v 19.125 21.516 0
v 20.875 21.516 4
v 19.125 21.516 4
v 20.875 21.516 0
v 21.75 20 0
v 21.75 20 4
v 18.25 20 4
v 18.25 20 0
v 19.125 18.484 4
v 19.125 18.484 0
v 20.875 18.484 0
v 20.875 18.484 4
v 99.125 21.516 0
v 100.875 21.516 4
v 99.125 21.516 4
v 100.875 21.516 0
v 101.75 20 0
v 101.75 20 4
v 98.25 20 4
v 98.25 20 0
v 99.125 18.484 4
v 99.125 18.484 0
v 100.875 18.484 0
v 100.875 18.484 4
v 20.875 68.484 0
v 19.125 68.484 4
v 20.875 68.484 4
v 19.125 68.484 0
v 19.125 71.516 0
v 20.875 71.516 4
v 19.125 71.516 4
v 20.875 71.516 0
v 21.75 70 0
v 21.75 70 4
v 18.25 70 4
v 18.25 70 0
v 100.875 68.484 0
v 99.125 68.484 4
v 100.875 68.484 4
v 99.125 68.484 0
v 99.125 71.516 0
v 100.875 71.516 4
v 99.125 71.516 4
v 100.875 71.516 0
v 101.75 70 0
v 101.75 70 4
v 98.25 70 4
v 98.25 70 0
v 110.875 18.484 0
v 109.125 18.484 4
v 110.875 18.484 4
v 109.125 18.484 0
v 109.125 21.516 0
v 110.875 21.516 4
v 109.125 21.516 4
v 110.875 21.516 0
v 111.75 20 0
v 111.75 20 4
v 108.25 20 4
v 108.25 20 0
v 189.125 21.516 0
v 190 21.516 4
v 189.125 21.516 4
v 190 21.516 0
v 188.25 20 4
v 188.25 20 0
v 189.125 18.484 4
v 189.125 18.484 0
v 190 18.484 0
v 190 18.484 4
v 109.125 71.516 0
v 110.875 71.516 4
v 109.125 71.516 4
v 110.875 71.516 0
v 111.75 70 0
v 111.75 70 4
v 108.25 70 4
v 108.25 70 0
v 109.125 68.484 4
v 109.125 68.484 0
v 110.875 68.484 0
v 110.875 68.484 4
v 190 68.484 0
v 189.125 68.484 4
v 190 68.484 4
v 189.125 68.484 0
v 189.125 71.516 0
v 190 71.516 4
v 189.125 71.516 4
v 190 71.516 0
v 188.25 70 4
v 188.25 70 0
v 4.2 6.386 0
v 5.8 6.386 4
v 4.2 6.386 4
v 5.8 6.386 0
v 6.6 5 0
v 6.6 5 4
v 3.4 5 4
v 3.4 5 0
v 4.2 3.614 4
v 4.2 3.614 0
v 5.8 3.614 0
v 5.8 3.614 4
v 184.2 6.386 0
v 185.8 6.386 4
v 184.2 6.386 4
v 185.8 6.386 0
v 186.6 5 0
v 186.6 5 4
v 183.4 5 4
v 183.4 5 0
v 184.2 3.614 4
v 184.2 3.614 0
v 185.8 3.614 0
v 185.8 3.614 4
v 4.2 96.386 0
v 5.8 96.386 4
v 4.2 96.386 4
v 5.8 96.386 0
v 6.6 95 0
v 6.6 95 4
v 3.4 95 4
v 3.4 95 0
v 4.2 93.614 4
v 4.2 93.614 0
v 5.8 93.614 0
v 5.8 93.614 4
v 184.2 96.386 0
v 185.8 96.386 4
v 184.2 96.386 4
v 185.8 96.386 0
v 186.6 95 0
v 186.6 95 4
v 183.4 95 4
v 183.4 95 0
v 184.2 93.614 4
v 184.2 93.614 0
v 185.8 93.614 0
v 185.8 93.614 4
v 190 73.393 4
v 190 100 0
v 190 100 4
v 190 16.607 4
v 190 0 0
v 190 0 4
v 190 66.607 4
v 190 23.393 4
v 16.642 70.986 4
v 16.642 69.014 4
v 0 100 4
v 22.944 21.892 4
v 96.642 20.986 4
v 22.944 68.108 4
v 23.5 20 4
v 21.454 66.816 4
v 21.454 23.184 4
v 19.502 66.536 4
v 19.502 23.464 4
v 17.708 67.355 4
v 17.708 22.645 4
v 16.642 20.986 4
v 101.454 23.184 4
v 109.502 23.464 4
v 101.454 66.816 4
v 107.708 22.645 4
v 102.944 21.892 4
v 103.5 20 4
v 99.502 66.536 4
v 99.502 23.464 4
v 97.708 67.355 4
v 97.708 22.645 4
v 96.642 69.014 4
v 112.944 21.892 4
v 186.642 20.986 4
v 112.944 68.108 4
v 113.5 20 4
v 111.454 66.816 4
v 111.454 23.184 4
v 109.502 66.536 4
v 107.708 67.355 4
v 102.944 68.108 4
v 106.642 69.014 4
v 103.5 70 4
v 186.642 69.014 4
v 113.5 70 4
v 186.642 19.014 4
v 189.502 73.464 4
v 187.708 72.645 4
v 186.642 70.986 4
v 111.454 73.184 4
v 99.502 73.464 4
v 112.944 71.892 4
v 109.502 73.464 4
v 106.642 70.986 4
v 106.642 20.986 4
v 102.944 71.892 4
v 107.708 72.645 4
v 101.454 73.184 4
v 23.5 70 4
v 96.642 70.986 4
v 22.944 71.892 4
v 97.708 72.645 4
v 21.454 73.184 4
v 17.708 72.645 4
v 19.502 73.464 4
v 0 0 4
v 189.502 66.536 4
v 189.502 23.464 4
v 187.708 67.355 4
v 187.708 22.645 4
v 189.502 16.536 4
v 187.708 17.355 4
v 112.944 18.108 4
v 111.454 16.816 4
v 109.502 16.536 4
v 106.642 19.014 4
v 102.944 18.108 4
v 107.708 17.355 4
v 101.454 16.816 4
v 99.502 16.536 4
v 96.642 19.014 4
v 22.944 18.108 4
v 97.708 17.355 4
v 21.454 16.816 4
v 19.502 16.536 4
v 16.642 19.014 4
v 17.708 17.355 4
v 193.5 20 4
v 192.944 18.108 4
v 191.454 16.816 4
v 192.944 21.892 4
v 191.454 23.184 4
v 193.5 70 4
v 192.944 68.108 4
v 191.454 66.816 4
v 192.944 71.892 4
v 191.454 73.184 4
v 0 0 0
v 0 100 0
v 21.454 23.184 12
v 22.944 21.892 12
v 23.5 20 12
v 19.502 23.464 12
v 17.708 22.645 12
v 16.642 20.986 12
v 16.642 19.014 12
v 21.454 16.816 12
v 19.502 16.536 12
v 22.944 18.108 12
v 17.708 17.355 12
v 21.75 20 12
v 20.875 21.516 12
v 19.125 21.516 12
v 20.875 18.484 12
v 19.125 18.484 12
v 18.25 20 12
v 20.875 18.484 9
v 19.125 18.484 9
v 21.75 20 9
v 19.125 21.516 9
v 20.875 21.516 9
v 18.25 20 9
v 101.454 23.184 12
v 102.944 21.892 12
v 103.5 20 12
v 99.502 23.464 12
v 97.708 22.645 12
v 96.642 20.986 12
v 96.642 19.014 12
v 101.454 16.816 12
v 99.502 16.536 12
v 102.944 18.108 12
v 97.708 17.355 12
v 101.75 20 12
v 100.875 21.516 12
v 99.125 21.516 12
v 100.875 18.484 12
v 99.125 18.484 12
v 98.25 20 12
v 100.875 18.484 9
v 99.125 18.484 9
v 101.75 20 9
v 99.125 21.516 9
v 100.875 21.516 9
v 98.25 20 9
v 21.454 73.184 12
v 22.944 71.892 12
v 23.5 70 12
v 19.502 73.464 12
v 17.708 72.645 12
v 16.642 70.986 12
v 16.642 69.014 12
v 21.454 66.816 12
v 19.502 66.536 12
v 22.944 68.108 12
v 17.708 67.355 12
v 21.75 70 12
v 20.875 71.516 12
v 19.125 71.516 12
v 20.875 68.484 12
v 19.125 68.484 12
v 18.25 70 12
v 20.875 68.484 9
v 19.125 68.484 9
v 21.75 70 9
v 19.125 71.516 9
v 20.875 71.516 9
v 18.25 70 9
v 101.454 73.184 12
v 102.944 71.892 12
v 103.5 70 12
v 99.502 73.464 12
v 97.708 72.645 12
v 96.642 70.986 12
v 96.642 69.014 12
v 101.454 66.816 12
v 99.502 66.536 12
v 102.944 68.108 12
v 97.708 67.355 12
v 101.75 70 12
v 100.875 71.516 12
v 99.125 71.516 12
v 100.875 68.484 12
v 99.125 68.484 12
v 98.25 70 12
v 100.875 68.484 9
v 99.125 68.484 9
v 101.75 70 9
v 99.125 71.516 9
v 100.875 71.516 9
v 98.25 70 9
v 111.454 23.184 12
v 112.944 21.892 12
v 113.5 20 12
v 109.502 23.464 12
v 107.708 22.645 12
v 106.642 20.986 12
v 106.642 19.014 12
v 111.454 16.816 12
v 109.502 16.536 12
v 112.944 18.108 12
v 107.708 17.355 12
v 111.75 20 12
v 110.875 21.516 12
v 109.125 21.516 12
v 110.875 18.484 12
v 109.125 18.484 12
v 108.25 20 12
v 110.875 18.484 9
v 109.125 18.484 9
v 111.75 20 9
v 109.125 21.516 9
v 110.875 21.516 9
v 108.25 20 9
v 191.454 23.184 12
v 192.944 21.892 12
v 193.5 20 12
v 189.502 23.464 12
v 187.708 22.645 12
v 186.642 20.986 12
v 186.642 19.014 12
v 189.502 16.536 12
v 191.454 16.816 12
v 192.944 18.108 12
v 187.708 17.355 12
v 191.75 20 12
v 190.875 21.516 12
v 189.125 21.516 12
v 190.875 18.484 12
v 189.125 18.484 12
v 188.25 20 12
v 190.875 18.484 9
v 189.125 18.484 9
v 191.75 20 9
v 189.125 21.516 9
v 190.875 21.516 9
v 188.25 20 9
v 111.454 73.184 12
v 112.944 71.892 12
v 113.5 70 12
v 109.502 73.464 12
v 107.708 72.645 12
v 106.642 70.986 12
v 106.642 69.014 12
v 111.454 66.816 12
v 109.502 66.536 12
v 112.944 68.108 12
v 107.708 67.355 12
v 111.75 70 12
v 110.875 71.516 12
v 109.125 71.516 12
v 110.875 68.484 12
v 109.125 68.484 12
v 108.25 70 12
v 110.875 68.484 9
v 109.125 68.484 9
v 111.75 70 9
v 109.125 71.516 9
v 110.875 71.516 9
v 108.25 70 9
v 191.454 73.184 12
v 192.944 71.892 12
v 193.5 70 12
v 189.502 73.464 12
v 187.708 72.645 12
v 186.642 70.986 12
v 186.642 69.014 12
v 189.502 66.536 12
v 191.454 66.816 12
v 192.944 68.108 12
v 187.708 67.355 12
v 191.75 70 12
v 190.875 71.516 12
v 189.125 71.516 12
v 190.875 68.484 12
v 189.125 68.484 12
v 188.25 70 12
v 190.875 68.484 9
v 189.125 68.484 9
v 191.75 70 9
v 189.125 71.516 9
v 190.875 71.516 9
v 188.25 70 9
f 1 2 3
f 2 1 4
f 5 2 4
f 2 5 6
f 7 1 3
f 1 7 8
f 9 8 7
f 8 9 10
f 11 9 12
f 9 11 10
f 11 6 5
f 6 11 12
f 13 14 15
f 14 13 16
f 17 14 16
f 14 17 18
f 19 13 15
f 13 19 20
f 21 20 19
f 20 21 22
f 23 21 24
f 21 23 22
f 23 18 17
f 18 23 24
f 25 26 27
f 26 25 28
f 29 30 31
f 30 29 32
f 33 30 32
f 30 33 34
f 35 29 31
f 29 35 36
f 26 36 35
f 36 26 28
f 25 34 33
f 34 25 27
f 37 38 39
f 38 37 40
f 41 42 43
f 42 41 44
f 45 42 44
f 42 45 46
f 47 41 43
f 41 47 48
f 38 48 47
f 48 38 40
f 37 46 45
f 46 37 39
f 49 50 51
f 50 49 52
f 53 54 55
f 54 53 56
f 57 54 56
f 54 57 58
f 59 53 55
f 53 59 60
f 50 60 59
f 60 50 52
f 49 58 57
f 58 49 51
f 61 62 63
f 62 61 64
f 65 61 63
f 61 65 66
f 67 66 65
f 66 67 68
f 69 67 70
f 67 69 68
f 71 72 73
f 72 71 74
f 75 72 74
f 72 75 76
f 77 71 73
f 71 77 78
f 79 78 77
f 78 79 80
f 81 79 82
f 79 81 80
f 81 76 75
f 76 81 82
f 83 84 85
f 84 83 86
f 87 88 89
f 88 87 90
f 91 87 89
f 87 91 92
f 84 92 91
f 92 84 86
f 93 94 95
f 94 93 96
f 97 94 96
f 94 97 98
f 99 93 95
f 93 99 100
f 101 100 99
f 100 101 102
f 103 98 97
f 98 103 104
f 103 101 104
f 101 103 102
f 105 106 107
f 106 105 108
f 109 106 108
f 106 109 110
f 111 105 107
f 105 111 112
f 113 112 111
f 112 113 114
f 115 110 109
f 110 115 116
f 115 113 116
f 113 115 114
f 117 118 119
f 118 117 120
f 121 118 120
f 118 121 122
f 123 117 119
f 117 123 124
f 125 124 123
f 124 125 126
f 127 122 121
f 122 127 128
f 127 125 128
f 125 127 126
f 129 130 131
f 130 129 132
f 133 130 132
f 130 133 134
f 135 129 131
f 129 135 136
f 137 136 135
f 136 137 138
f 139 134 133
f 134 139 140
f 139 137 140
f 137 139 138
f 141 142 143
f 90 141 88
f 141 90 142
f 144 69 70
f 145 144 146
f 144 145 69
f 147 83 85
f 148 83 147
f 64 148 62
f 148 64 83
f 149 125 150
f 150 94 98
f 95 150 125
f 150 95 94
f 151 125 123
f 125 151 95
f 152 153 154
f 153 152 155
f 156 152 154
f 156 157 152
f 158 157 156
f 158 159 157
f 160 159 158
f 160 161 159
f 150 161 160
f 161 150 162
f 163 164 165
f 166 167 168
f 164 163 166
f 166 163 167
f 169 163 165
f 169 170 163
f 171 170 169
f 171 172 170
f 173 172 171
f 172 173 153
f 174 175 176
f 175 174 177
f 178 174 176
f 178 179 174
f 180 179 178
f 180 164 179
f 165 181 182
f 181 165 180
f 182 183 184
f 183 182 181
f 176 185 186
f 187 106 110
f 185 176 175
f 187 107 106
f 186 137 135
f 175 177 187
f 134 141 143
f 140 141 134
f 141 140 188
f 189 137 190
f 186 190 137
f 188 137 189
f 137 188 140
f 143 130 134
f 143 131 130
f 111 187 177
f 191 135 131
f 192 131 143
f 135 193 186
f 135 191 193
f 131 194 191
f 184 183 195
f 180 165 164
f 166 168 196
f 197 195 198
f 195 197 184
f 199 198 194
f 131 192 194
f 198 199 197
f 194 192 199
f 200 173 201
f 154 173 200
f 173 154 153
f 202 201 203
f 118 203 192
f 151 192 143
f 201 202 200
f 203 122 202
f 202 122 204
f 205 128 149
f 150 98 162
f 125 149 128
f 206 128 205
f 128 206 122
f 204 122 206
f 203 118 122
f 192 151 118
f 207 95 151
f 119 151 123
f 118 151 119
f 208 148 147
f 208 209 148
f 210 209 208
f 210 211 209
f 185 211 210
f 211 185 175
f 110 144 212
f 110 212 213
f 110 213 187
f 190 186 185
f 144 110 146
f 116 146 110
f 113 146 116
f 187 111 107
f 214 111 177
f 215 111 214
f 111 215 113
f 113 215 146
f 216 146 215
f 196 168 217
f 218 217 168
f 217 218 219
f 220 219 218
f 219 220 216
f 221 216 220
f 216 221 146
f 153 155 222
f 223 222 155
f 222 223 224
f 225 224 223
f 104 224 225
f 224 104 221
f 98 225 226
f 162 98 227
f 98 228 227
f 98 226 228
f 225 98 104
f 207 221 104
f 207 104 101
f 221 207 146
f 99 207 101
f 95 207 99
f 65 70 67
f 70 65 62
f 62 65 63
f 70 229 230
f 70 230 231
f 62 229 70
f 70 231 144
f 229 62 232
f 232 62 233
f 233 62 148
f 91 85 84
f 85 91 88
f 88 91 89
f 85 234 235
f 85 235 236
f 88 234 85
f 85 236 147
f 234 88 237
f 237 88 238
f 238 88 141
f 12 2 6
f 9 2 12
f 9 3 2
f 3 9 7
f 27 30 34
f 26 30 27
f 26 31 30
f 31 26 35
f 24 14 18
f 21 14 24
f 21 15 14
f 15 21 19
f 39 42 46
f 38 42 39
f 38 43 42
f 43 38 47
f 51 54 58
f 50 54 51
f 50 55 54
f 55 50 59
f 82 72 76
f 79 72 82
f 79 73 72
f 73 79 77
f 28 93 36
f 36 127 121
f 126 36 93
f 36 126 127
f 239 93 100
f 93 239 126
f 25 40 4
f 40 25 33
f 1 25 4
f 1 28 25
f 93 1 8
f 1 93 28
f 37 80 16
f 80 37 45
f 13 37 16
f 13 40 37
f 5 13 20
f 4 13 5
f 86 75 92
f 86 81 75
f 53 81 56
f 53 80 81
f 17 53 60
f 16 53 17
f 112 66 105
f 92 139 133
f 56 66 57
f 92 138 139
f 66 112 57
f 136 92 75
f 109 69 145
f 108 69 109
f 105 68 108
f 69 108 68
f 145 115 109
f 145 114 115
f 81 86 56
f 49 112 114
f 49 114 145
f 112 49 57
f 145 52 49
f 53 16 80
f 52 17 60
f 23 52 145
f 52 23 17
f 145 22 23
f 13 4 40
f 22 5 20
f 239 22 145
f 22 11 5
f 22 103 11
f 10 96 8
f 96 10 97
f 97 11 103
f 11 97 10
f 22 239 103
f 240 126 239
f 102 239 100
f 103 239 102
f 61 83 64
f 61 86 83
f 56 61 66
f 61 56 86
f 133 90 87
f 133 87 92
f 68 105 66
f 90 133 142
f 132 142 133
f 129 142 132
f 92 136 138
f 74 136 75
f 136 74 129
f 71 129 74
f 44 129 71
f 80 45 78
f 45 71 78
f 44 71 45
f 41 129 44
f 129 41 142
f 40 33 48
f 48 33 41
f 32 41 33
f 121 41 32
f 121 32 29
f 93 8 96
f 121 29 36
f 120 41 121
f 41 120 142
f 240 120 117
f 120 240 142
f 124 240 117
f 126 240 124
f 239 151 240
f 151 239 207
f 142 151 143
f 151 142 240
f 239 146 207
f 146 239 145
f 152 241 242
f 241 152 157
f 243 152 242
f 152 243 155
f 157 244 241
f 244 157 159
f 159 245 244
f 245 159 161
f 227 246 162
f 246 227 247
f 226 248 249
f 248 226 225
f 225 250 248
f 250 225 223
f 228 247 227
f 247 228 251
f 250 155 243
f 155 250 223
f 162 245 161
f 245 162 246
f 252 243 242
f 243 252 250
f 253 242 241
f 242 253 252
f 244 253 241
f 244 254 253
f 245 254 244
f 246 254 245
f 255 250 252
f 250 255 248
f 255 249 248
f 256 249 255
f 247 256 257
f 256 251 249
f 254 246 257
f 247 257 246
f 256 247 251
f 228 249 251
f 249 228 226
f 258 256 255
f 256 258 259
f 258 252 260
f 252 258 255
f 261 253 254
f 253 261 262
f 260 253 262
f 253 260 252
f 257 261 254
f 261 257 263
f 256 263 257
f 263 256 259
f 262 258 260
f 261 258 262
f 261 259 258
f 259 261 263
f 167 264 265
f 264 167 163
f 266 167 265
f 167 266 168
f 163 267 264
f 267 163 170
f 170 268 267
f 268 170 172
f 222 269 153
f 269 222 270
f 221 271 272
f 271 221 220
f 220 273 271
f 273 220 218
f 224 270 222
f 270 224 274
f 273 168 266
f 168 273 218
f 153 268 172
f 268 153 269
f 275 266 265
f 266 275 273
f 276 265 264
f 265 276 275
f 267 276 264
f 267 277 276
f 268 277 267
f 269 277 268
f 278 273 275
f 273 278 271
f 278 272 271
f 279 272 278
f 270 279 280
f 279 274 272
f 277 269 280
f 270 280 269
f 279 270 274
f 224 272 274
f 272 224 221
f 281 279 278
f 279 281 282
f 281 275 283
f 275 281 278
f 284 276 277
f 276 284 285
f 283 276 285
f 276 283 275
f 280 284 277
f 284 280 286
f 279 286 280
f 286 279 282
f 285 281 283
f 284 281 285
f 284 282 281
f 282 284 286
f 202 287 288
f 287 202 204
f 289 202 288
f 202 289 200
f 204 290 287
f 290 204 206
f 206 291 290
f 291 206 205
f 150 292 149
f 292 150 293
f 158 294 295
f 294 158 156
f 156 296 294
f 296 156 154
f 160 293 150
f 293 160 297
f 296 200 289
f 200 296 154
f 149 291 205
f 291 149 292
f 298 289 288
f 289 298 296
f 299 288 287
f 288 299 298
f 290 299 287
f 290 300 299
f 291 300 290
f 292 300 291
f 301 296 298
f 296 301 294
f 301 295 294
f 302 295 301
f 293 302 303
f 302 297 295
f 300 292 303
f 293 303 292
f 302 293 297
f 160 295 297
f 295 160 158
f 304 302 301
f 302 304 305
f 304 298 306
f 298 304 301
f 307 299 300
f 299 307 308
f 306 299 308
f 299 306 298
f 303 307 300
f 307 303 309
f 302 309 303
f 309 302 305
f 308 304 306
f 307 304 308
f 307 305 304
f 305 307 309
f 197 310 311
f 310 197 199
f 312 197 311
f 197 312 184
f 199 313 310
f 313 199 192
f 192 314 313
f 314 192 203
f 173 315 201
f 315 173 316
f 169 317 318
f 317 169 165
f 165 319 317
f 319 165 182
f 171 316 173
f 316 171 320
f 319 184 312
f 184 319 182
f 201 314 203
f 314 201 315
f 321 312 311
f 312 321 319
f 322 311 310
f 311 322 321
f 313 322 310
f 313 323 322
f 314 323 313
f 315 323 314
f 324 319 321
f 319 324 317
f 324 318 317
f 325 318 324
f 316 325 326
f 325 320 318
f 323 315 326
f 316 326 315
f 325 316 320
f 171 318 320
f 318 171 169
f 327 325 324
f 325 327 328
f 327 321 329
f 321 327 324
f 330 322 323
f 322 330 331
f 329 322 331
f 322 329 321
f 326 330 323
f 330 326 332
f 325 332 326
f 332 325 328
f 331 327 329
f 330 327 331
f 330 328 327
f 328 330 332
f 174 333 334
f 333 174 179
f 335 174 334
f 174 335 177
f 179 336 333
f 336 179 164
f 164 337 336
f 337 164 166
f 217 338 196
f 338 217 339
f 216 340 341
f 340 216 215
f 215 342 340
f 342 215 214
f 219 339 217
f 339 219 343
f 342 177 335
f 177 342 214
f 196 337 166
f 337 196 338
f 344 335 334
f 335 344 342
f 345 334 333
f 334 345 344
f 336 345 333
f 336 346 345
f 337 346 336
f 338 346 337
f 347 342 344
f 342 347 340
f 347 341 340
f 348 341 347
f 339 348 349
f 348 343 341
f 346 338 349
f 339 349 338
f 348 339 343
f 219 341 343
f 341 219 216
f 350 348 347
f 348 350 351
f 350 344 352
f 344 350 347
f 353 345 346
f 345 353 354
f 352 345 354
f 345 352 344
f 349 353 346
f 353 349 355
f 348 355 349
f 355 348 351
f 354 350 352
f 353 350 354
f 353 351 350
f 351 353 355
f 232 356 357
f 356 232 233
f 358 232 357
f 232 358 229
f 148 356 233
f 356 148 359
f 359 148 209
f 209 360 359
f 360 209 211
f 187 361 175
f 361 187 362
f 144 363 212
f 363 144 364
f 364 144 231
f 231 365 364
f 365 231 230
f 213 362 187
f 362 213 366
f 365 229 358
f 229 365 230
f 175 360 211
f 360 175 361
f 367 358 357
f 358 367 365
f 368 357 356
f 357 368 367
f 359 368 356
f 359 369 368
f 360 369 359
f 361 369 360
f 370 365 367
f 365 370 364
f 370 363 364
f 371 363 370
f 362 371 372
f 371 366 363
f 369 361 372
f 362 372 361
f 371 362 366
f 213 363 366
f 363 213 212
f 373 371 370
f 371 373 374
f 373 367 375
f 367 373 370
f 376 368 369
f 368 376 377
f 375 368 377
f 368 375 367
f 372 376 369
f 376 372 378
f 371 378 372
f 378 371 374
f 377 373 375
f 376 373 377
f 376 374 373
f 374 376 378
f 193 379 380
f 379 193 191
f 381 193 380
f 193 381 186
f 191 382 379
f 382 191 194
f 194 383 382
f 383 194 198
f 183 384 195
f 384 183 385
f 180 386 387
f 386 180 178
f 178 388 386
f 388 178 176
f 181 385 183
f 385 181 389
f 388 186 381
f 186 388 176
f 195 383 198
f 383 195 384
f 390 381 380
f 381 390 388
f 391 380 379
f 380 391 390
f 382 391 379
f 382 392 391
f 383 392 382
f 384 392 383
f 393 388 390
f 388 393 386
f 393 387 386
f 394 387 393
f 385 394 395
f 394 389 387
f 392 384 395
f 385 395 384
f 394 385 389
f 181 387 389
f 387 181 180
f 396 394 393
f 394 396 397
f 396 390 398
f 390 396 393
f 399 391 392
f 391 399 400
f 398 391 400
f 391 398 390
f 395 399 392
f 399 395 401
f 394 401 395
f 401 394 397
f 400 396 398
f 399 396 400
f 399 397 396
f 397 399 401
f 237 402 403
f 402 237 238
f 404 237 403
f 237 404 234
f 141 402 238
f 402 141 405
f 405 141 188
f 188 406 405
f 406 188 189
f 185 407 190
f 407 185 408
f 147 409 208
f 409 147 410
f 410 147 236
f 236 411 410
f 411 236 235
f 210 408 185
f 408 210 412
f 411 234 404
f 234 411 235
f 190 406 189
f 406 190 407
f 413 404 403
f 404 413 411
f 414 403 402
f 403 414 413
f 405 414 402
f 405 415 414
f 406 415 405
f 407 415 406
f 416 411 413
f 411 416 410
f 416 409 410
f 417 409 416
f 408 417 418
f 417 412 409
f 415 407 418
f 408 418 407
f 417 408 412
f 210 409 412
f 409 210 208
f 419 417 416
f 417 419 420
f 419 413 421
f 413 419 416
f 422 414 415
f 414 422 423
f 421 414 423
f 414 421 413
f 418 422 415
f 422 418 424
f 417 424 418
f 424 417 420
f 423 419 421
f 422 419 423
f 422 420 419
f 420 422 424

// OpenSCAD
// Montazni desticka do centralni krabice — drzi 2x 8CH relay board
// + 24V PSU + 5V PSU; roztece si PREZMUR dle svych desticek ( default:
// 8CH modul 87x56x17 mm, otvory 3.2 mm v rozich 80x50 ).
// PLA staci (desticka se nefreje), 25% infill, 3 steny.
board_l = 80; board_w = 50; hole_d = 3.5; standoff_h = 8;
plate_l = 190; plate_w = 100;
difference() {
  cube([plate_l, plate_w, 4]);
  // 2x sada 4 sroubu pro relay moduly (soba v X za sebou)
  for (bx = [0, 90]) for (p = [[0,0],[board_l,0],[0,board_w],[board_l,board_w]])
    translate([20 + bx + p[0], 20 + p[1], -0.5])
      cylinder(h = 5, d = hole_d);
  // montazni rohy desticky do krabice
  for (p = [[5,5],[plate_l-5,5],[5,plate_w-5],[plate_l-5,plate_w-5]])
    translate([p[0], p[1], -0.5]) cylinder(h = 5, d = 3.2);
}
// postaveni (stojany pod moduly) — tisk zvlast nebo support-free sloupky:
for (bx = [0, 90]) for (p = [[0,0],[board_l,0],[0,board_w],[board_l,board_w]])
  translate([20 + bx + p[0], 20 + p[1], 4])
    difference() { cylinder(h = standoff_h, d = 7);
      translate([0,0,standoff_h-3]) cylinder(h=4, d=hole_d); }
